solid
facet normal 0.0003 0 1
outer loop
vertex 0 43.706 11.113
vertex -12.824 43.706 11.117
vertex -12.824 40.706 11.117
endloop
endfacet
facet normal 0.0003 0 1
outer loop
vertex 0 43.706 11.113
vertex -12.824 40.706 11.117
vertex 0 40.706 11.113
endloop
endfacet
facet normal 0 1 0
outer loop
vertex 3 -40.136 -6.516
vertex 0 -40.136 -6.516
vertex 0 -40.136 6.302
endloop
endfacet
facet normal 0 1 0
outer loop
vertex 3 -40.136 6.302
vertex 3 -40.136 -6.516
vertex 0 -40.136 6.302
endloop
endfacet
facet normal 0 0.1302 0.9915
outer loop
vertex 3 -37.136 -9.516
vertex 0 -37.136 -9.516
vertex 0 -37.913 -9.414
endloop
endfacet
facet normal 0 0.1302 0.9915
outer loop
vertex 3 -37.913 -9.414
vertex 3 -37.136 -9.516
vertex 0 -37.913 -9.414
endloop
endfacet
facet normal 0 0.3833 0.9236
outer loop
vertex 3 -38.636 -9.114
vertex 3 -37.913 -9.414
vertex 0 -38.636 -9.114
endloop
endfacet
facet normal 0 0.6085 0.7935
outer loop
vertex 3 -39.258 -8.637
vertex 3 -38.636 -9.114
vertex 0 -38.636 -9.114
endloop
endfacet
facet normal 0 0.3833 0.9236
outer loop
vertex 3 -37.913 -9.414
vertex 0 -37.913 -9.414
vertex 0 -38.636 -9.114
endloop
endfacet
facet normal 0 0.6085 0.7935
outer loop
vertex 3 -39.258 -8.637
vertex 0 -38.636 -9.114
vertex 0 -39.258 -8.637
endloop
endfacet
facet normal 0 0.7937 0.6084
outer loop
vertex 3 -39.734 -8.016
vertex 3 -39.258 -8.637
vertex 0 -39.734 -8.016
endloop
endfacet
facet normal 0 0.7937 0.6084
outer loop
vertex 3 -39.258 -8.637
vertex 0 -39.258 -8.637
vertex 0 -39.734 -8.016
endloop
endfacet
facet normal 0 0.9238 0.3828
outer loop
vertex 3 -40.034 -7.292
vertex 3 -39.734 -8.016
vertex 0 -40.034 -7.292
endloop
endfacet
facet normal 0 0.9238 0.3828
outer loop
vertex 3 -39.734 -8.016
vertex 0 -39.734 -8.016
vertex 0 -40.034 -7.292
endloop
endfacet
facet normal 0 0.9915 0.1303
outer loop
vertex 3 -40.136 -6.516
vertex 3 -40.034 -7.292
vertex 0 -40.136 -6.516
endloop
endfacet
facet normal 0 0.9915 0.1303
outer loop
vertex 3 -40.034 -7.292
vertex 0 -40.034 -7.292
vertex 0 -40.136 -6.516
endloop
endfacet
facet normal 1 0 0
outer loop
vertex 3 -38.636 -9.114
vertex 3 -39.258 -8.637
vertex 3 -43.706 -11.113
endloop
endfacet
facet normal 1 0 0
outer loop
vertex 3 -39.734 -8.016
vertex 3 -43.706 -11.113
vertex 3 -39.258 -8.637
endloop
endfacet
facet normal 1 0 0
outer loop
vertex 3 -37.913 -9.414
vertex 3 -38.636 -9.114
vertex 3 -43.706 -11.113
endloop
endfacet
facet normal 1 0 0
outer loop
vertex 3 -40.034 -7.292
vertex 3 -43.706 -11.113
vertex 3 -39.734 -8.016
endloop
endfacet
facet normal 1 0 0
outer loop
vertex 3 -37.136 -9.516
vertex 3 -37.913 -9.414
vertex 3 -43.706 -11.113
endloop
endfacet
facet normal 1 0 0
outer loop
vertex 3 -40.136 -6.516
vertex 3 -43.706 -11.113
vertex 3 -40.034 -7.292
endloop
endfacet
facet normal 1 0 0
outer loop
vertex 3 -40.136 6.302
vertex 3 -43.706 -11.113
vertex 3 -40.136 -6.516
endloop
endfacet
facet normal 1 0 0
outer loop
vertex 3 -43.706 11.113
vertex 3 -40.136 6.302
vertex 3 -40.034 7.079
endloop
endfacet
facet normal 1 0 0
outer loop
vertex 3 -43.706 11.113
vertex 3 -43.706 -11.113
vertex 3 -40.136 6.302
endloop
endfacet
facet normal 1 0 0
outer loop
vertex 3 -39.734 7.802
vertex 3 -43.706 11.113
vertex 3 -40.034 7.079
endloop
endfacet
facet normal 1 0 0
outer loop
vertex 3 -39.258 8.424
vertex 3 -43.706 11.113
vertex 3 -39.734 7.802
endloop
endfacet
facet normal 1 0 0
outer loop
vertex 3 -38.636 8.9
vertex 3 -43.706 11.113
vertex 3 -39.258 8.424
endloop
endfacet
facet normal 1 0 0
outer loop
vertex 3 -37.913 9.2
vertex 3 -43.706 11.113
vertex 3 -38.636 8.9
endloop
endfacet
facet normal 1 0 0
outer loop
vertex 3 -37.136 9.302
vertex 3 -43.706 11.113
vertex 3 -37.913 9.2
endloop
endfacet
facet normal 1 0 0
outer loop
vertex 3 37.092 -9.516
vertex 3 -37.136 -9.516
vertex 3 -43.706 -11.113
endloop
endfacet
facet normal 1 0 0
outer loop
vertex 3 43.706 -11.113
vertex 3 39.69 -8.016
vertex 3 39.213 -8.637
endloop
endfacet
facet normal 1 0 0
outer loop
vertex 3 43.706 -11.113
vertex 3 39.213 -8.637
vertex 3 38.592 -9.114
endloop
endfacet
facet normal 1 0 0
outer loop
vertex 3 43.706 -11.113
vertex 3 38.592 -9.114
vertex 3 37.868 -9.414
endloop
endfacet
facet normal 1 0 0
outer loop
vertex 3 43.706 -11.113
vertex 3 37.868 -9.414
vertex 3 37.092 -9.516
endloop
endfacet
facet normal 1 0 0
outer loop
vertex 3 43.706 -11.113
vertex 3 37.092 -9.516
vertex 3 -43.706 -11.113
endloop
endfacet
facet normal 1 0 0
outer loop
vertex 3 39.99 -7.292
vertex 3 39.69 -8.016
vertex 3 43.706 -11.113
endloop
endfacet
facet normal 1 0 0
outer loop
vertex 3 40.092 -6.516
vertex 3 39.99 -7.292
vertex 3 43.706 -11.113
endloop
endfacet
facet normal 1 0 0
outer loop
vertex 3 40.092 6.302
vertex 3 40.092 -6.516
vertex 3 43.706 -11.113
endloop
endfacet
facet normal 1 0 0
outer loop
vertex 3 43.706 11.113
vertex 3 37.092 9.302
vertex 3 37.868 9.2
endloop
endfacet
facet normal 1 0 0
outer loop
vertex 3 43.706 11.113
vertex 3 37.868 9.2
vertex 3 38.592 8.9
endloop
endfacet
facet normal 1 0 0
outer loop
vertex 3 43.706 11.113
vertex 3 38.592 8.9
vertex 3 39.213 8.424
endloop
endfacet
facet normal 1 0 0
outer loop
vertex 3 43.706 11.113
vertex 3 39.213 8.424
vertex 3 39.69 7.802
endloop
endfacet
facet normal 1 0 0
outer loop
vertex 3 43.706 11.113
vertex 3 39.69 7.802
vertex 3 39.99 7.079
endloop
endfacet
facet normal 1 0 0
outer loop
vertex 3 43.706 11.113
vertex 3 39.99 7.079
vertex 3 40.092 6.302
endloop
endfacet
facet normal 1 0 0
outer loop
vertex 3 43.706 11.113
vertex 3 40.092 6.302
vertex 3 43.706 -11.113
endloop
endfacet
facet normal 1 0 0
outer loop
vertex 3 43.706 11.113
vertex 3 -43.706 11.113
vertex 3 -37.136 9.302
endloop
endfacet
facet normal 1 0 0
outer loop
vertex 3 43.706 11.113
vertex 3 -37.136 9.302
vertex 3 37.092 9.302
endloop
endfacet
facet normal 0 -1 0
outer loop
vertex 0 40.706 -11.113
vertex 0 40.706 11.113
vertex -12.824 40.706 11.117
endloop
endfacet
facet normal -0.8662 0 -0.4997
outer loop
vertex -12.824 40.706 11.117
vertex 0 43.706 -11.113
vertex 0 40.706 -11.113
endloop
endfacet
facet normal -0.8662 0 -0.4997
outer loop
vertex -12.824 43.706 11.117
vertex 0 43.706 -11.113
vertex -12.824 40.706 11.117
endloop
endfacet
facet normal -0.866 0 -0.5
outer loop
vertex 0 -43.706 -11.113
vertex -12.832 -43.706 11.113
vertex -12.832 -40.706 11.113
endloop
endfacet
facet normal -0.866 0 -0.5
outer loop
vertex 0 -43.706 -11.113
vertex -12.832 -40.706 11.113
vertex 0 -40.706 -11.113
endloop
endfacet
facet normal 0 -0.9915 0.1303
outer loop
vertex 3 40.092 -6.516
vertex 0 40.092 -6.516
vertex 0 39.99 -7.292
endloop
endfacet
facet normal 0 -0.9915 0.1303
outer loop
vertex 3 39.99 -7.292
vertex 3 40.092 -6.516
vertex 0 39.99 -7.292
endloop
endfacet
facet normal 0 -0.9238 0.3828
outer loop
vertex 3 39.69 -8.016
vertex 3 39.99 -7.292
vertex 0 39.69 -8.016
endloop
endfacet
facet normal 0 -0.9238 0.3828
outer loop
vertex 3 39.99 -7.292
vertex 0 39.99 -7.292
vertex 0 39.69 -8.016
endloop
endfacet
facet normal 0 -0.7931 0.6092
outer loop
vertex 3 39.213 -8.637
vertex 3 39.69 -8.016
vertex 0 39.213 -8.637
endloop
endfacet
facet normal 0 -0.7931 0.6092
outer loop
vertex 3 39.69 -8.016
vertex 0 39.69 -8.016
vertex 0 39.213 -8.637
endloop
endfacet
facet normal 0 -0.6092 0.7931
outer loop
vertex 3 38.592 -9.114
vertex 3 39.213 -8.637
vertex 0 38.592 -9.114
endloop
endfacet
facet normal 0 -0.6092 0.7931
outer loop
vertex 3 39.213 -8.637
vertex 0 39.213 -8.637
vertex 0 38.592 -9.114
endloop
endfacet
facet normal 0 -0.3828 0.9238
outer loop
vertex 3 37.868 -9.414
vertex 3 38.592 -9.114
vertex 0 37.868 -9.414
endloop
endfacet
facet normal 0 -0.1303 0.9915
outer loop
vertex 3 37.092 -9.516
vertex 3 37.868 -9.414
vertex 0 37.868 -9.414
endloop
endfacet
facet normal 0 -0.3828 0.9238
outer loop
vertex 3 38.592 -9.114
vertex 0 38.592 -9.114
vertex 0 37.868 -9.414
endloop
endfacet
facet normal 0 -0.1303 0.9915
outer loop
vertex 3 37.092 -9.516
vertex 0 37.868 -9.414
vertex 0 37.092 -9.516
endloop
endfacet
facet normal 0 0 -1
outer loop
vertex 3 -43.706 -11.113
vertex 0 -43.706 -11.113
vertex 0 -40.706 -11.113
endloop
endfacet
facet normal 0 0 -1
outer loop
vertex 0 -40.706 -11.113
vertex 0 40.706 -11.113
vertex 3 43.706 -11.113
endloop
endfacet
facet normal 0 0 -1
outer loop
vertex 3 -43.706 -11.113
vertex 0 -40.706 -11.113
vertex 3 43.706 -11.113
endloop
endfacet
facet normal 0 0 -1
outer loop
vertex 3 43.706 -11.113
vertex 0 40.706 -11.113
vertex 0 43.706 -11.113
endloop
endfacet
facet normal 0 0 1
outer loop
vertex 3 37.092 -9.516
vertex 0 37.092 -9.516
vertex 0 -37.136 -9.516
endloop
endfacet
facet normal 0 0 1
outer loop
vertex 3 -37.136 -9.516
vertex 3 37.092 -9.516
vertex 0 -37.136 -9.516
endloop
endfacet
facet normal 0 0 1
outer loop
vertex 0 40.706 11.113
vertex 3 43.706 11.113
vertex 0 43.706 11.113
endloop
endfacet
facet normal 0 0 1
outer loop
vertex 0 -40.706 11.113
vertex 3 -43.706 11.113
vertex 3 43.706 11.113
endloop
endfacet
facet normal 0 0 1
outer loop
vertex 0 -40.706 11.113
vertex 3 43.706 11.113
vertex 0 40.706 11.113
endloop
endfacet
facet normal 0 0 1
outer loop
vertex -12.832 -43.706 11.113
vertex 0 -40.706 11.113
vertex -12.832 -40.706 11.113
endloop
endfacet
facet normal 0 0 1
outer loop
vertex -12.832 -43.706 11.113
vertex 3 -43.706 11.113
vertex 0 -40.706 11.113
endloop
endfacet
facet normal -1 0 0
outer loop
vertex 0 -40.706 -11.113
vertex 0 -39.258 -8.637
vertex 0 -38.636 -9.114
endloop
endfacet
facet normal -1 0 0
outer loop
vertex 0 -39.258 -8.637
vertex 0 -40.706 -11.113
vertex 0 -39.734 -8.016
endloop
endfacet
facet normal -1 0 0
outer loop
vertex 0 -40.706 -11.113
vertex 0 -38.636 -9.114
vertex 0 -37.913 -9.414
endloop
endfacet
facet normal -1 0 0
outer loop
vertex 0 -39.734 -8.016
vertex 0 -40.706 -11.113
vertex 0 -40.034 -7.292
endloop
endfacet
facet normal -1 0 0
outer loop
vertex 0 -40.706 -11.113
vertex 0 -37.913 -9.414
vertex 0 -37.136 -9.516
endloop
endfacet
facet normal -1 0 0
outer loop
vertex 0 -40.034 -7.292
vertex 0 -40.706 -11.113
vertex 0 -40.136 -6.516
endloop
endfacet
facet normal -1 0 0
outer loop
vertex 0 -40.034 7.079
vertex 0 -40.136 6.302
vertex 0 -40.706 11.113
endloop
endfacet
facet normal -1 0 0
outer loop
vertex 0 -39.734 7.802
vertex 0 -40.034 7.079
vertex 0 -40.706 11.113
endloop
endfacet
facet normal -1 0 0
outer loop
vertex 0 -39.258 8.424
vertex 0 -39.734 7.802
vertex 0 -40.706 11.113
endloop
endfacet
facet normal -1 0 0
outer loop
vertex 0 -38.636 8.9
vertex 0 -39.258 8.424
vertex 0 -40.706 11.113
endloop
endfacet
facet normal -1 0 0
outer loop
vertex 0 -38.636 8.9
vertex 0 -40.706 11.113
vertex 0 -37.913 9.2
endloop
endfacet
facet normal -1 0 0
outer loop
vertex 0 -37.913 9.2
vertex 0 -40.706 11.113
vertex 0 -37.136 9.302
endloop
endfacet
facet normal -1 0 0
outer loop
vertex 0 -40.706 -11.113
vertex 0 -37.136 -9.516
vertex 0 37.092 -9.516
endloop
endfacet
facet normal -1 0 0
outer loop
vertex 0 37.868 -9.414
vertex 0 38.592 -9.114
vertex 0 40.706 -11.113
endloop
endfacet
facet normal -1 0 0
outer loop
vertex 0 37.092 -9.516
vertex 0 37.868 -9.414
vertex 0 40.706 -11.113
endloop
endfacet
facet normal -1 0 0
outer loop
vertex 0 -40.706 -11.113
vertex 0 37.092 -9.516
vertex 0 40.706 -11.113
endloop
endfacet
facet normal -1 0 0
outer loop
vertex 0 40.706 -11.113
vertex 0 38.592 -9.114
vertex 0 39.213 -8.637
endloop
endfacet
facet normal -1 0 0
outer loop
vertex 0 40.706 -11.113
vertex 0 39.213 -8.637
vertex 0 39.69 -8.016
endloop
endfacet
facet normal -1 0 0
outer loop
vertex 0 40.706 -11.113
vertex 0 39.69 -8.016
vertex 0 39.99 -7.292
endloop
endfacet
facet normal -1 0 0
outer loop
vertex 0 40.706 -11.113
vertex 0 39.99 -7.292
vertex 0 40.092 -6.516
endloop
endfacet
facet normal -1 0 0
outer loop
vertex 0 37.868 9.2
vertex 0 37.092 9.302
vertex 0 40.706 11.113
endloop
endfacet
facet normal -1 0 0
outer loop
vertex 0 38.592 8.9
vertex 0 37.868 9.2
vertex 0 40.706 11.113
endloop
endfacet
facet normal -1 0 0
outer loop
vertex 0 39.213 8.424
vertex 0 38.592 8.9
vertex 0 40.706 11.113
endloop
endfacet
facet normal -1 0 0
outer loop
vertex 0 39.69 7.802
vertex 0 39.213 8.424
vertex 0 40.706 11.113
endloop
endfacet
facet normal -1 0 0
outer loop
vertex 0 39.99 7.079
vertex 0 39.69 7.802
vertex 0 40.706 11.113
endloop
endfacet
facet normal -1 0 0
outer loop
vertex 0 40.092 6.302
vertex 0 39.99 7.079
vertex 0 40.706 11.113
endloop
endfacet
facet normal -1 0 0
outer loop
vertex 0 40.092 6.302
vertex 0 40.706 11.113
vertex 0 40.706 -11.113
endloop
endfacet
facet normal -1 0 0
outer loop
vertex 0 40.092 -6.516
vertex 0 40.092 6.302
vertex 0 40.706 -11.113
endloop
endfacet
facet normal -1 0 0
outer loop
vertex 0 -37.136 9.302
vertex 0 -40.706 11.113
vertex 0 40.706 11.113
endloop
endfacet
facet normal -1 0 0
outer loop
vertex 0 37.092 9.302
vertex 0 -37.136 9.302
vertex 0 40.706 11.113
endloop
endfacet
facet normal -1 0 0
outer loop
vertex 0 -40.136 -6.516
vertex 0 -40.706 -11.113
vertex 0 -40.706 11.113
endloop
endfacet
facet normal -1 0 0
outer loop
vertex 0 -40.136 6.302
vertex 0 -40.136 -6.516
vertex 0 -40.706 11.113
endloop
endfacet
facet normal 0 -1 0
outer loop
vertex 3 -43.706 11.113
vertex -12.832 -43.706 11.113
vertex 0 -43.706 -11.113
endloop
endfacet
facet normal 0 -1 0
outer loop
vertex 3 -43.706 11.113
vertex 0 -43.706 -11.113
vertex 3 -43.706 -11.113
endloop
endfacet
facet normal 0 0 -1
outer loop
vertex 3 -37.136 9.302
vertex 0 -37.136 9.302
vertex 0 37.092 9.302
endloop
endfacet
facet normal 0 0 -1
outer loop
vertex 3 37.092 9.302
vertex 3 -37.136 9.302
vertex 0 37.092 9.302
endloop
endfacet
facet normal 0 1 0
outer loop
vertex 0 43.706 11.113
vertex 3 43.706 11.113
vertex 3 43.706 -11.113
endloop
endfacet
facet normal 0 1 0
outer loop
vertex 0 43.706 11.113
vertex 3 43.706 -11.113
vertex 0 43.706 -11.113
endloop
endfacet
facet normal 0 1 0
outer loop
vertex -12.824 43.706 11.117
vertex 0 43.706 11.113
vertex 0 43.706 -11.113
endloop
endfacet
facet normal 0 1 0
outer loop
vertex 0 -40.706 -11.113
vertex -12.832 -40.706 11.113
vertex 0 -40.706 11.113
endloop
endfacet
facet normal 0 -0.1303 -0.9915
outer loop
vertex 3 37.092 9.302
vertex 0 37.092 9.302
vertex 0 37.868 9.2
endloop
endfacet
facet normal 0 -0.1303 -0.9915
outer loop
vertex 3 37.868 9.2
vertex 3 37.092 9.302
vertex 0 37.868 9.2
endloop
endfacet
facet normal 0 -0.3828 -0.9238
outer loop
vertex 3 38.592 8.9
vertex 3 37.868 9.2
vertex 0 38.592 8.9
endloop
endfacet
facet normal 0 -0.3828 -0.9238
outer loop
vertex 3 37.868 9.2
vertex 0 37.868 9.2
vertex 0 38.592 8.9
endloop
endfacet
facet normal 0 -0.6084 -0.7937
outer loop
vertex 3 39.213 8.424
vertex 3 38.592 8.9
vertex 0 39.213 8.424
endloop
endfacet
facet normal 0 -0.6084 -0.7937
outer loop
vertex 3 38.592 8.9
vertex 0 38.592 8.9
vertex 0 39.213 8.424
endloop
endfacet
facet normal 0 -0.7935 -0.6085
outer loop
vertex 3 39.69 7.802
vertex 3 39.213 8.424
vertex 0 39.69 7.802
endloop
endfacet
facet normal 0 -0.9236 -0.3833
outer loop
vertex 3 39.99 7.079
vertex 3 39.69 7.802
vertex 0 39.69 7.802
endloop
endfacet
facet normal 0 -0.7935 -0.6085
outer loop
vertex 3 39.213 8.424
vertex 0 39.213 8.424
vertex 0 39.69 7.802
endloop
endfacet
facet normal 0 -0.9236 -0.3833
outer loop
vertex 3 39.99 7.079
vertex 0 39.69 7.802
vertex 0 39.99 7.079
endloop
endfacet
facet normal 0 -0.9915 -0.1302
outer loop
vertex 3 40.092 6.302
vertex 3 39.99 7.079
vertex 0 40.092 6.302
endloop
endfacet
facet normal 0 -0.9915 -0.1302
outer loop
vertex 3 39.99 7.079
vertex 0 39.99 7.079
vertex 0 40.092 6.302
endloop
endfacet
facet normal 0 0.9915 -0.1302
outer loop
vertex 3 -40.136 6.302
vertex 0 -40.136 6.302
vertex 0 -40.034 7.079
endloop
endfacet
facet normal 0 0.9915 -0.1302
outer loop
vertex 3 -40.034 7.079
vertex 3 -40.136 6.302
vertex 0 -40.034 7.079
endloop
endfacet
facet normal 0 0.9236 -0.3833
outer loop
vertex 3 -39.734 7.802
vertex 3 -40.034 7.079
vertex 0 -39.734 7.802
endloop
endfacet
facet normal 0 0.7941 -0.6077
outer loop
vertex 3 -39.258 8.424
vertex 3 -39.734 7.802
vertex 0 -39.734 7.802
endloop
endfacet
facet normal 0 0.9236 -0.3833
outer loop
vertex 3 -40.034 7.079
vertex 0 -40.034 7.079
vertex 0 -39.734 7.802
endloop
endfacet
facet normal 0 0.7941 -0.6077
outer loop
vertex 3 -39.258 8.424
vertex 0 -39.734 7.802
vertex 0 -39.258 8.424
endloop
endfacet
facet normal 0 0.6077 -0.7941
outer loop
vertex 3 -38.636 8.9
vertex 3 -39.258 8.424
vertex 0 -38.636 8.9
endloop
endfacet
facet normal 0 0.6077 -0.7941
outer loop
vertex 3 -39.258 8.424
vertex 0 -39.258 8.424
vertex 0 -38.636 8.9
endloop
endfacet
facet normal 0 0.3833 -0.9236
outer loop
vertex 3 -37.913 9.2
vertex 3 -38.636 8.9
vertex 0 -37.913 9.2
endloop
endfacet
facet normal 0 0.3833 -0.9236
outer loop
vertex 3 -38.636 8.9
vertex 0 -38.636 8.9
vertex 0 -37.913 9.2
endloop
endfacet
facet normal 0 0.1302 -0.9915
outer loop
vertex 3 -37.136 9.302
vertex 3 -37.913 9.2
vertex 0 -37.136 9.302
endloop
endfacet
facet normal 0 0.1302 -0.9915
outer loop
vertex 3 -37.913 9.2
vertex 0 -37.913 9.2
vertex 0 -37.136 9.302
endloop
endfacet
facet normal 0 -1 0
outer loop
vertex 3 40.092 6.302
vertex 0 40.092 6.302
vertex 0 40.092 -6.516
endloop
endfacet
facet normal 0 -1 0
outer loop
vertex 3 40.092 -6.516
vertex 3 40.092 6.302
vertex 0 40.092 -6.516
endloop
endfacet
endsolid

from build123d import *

# Parameters (mm, degrees)
F0_W     = 2.142924
F0_H     = 22.22561
F1_DEPTH = 3
F3_DEPTH = 3
F5_DEPTH = 3


with BuildPart() as f1:
    # F0 (on Right) → F1 (new body)
    with BuildSketch(Plane.YZ):
        Polygon((-41.607222, 6.203198), (-41.607222, -6.416802), (-41.607222, -11.112805), (41.562778, -11.112805), (41.562778, 11.112805), (-41.607222, 11.112805), align=None)
        with BuildLine():
            ThreePointArc((-40.136308, 6.302186), (-39.257629, 8.423506), (-37.136308, 9.302186))
            Line((-37.136308, 9.302186), (37.091864, 9.302186))
            ThreePointArc((37.091864, 9.302186), (39.213184, 8.423506), (40.091864, 6.302186))
            Line((40.091864, 6.302186), (40.091864, -6.51579))
            ThreePointArc((40.091864, -6.51579), (39.213184, -8.63711), (37.091864, -9.51579))
            Line((37.091864, -9.51579), (-37.136308, -9.51579))
            ThreePointArc((-37.136308, -9.51579), (-39.257629, -8.63711), (-40.136308, -6.51579))
            Line((-40.136308, -6.51579), (-40.136308, 6.302186))
        make_face(mode=Mode.SUBTRACT)
        Polygon((-41.607222, -11.112805), (-41.607222, -6.416802), (-41.607222, 6.203198), (-41.607222, 11.112805), (-43.705702, 11.112805), (-43.705702, -11.112805), align=None)
        with Locations((42.63424, 0)):
            Rectangle(F0_W, F0_H)
    extrude(amount=F1_DEPTH)

    # F2 (on face) → F3 (join)
    with BuildSketch(Plane.XZ.offset(43.705702)):
        Polygon((0, -11.112805), (0, 11.112805), (-12.831961, 11.112805), align=None)
    extrude(amount=-F3_DEPTH)

    # F4 (on face) → F5 (join)
    with BuildSketch(Plane(origin=(0, 43.705702, 0), x_dir=(-1, 0, 0), z_dir=(0, 1, 0))):
        Polygon((12.824409, 11.117161), (0, 11.112805), (0, -11.112805), align=None)
    extrude(amount=-F5_DEPTH)


solid = f1.part
